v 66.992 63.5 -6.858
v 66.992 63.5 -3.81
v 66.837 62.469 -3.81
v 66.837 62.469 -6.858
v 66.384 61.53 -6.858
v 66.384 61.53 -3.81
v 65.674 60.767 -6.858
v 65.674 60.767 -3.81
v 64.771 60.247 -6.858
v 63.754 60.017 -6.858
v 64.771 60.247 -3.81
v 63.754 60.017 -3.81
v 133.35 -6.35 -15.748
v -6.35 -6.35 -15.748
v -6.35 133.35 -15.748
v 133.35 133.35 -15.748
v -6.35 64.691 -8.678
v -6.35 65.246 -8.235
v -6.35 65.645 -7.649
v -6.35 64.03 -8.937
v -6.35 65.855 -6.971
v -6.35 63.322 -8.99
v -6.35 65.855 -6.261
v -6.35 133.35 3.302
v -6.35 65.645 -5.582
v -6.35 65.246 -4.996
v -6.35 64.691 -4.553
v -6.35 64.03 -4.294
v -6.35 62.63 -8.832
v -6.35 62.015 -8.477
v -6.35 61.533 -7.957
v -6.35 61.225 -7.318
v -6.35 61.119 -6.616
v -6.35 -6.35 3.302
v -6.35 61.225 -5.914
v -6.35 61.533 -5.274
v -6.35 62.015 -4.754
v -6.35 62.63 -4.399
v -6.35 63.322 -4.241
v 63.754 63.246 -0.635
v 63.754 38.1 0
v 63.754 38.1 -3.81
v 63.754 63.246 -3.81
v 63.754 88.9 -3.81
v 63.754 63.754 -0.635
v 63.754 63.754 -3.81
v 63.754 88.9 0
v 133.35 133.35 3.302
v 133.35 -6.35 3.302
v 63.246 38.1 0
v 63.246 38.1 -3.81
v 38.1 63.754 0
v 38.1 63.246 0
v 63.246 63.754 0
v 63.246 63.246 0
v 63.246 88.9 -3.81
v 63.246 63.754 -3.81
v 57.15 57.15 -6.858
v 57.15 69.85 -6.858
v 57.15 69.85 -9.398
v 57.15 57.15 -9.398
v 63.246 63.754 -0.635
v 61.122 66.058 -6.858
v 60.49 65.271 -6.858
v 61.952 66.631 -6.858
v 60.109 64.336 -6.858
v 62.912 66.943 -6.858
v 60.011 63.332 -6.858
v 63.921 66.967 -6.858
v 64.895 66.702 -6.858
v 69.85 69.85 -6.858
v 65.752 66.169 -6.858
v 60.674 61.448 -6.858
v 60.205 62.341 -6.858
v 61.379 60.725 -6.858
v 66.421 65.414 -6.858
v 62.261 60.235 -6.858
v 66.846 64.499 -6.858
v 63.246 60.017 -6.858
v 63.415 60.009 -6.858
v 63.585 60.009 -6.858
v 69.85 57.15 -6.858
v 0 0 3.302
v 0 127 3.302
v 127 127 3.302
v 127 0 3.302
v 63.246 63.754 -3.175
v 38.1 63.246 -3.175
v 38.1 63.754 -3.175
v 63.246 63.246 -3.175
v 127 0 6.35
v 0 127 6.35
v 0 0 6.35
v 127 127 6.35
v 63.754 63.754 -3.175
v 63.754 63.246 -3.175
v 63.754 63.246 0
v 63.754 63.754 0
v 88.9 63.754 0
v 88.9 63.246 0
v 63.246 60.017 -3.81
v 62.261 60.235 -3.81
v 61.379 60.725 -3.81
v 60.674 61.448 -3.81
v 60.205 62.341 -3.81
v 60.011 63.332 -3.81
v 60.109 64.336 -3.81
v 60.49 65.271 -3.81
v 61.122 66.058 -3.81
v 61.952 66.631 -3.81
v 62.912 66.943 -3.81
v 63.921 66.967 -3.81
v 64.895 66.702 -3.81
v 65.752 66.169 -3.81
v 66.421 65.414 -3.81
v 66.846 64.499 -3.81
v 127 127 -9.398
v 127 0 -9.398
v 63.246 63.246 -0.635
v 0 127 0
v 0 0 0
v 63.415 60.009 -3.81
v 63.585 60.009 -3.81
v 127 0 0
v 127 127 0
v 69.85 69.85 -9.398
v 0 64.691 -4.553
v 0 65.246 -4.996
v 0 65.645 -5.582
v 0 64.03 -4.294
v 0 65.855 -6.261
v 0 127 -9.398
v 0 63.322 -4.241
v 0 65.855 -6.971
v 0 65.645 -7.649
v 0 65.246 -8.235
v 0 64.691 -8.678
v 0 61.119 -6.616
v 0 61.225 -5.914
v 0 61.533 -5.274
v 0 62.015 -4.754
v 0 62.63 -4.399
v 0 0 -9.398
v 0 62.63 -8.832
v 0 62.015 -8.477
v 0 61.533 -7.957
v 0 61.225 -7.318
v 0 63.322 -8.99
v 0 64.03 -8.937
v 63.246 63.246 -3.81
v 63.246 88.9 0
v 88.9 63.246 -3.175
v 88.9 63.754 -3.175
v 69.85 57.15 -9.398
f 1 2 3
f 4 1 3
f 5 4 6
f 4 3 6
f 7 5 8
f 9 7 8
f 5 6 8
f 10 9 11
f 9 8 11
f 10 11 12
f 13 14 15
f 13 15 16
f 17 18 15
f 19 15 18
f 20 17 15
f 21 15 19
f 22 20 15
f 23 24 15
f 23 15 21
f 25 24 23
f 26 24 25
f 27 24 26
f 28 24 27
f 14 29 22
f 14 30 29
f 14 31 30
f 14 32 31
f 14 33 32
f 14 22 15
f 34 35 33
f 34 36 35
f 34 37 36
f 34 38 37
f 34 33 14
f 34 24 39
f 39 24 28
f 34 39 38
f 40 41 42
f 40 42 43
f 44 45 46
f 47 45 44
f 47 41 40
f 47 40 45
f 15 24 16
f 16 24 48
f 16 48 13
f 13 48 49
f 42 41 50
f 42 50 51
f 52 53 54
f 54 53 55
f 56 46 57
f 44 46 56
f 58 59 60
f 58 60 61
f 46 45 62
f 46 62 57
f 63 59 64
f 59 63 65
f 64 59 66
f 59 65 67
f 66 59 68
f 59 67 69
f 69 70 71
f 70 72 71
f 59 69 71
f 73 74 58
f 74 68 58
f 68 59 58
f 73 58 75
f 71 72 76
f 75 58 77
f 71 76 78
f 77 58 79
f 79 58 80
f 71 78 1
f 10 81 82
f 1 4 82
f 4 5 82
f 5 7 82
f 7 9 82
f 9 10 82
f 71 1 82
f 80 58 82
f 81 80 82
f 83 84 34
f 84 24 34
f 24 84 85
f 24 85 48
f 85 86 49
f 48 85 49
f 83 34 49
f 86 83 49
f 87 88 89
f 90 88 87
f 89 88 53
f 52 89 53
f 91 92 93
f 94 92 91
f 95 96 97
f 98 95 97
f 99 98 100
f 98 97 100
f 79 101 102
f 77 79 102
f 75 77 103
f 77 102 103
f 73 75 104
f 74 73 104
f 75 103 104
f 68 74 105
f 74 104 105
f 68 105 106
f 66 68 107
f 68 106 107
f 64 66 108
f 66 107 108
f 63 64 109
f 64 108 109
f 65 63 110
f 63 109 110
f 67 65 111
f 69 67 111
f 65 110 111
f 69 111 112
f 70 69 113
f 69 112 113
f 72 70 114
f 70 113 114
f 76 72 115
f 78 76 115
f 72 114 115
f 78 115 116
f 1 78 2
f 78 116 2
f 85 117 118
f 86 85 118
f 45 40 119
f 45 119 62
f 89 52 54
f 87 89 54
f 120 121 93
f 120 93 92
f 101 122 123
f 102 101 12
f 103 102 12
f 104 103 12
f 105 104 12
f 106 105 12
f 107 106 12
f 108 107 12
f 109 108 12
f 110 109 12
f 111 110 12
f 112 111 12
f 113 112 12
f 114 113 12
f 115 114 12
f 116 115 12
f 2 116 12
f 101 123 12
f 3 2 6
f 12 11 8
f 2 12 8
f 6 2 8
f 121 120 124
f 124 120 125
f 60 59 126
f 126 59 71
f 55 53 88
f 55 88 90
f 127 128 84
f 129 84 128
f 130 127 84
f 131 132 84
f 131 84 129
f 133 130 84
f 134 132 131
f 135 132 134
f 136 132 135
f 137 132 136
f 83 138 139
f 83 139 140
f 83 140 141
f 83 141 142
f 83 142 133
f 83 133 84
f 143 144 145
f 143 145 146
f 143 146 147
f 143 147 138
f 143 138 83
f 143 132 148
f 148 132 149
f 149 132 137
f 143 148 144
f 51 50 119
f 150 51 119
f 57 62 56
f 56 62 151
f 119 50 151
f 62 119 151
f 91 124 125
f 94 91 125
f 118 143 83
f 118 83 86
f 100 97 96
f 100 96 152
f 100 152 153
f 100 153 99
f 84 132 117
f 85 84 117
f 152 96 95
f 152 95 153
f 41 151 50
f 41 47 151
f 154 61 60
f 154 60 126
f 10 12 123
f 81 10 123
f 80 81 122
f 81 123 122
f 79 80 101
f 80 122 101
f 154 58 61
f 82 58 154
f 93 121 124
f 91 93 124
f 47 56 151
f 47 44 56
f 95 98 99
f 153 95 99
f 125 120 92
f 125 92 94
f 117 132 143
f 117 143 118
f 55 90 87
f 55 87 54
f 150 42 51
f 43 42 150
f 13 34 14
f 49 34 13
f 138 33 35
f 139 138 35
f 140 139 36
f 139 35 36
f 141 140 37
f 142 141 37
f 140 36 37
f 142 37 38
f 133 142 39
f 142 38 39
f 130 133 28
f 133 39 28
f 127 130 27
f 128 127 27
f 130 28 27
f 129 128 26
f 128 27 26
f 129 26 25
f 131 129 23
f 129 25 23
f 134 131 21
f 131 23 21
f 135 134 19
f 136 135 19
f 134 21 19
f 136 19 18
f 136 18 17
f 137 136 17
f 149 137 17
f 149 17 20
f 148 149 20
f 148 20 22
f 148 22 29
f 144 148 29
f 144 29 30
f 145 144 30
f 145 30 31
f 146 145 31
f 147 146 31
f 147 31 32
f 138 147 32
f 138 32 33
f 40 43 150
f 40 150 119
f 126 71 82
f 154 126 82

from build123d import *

# Parameters (mm, degrees)
F0_W      = 127
F0_H      = 127
F1_DEPTH  = 6.35
F4_DEPTH  = 0.254
F6_W      = 25.146
F6_H      = 3.175
F7_DEPTH  = 0.254
F9_DEPTH  = 3.048
F10_W     = 12.7
F10_H     = 12.7
F10_R     = 3.4925
F11_DEPTH = 2.54
F12_W     = 139.6999998465
F12_H     = 139.6999998465
F12_W_2   = 127
F12_H_2   = 127
F13_DEPTH = 12.7
F15_W     = 139.6999998465
F15_H     = 139.6999998465
F16_DEPTH = 6.35
F18_R     = 2.38125
F19_DEPTH = 25.4


with BuildPart() as f1:
    # F0 (on Top) → F1 (new body)
    with BuildSketch(Plane.XY):
        with Locations((63.5, 63.5)):
            Rectangle(F0_W, F0_H)
    extrude(amount=F1_DEPTH)


with BuildPart() as f4:
    # F3 (on offset) → F4 (new body, symmetric)
    with BuildSketch(Plane.YZ.offset(63.5)):
        Polygon((88.9, 0), (38.1, 0), (38.1, -3.81), (63.246, -3.81), (63.246, -0.635), (63.754, -0.635), (63.754, -3.81), (88.9, -3.81), align=None)
    extrude(amount=F4_DEPTH, both=True)


with BuildPart() as f7:
    # F6 (on offset) → F7 (new body, symmetric)
    with BuildSketch(Plane.XZ.offset(-63.5)):
        with Locations((76.327, -1.5875)):
            Rectangle(F6_W, F6_H)
    extrude(amount=F7_DEPTH, both=True)


with BuildPart() as f7b:
    # F6 (on offset) → F7, piece 2 (new body, symmetric)
    with BuildSketch(Plane.XZ.offset(-63.5)):
        with Locations((50.673, -1.5875)):
            Rectangle(F6_W, F6_H)
    extrude(amount=F7_DEPTH, both=True)


with BuildPart() as f9:
    # F8 (on face) → F9 (new body)
    with BuildSketch(Plane(origin=(0, 0, -3.81), x_dir=(1, 0, 0), z_dir=(0, 0, -1))):
        with BuildLine():
            Line((63.754, -63.246), (63.754, -60.0167650312))
            ThreePointArc((63.754, -60.0167650312), (63.5000005977, -60.0075000073), (63.246, -60.0167322023))
            Line((63.246, -60.0167322023), (63.246, -63.246))
            Line((63.246, -63.246), (63.754, -63.246))
        make_face()
        with BuildLine():
            ThreePointArc((63.246, -60.0167322023), (61.1216193726, -66.0577201845), (66.992274899, -63.5))
            ThreePointArc((66.992274899, -63.5), (66.0576487637, -61.1220097682), (63.754, -60.0167650312))
            Line((63.754, -60.0167650312), (63.754, -63.246))
            Line((63.754, -63.246), (63.246, -63.246))
            Line((63.246, -63.246), (63.246, -60.0167322023))
        make_face()
    extrude(amount=F9_DEPTH)

    # F10 (on face) → F11 (join)
    with BuildSketch(Plane(origin=(0, 0, -6.858), x_dir=(1, 0, 0), z_dir=(0, 0, -1))):
        with Locations((63.499774899, -63.5)):
            Rectangle(F10_W, F10_H)
        with Locations((63.499774899, -63.5)):
            Circle(F10_R, mode=Mode.SUBTRACT)
        with Locations((63.499774899, -63.5)):
            Circle(F10_R)
    extrude(amount=F11_DEPTH)


with BuildPart() as f13:
    # F12 (on face) → F13 (new body)
    with BuildSketch(Plane(origin=(0, 0, -9.398), x_dir=(1, 0, 0), z_dir=(0, 0, -1))):
        with Locations((63.5, -63.5)):
            Rectangle(F12_W, F12_H)
        with Locations((63.5, -63.5)):
            Rectangle(F12_W_2, F12_H_2, mode=Mode.SUBTRACT)
    extrude(amount=-F13_DEPTH)

    # F15 (on face) → F16 (join)
    with BuildSketch(Plane(origin=(0, 0, -9.398), x_dir=(1, 0, 0), z_dir=(0, 0, -1))):
        with Locations((63.5, -63.5)):
            Rectangle(F15_W, F15_H)
    extrude(amount=F16_DEPTH)

    # F18 (on face) → F19 (cut)
    with BuildSketch(Plane(origin=(-6.3499999233, 0, 0), x_dir=(0, -1, 0), z_dir=(-1, 0, 0))):
        with Locations((-63.5, -6.6156850821)):
            Circle(F18_R)
    extrude(amount=-F19_DEPTH, mode=Mode.SUBTRACT)


solid = Compound([f1.part, f4.part, f7.part, f7b.part, f9.part, f13.part])
